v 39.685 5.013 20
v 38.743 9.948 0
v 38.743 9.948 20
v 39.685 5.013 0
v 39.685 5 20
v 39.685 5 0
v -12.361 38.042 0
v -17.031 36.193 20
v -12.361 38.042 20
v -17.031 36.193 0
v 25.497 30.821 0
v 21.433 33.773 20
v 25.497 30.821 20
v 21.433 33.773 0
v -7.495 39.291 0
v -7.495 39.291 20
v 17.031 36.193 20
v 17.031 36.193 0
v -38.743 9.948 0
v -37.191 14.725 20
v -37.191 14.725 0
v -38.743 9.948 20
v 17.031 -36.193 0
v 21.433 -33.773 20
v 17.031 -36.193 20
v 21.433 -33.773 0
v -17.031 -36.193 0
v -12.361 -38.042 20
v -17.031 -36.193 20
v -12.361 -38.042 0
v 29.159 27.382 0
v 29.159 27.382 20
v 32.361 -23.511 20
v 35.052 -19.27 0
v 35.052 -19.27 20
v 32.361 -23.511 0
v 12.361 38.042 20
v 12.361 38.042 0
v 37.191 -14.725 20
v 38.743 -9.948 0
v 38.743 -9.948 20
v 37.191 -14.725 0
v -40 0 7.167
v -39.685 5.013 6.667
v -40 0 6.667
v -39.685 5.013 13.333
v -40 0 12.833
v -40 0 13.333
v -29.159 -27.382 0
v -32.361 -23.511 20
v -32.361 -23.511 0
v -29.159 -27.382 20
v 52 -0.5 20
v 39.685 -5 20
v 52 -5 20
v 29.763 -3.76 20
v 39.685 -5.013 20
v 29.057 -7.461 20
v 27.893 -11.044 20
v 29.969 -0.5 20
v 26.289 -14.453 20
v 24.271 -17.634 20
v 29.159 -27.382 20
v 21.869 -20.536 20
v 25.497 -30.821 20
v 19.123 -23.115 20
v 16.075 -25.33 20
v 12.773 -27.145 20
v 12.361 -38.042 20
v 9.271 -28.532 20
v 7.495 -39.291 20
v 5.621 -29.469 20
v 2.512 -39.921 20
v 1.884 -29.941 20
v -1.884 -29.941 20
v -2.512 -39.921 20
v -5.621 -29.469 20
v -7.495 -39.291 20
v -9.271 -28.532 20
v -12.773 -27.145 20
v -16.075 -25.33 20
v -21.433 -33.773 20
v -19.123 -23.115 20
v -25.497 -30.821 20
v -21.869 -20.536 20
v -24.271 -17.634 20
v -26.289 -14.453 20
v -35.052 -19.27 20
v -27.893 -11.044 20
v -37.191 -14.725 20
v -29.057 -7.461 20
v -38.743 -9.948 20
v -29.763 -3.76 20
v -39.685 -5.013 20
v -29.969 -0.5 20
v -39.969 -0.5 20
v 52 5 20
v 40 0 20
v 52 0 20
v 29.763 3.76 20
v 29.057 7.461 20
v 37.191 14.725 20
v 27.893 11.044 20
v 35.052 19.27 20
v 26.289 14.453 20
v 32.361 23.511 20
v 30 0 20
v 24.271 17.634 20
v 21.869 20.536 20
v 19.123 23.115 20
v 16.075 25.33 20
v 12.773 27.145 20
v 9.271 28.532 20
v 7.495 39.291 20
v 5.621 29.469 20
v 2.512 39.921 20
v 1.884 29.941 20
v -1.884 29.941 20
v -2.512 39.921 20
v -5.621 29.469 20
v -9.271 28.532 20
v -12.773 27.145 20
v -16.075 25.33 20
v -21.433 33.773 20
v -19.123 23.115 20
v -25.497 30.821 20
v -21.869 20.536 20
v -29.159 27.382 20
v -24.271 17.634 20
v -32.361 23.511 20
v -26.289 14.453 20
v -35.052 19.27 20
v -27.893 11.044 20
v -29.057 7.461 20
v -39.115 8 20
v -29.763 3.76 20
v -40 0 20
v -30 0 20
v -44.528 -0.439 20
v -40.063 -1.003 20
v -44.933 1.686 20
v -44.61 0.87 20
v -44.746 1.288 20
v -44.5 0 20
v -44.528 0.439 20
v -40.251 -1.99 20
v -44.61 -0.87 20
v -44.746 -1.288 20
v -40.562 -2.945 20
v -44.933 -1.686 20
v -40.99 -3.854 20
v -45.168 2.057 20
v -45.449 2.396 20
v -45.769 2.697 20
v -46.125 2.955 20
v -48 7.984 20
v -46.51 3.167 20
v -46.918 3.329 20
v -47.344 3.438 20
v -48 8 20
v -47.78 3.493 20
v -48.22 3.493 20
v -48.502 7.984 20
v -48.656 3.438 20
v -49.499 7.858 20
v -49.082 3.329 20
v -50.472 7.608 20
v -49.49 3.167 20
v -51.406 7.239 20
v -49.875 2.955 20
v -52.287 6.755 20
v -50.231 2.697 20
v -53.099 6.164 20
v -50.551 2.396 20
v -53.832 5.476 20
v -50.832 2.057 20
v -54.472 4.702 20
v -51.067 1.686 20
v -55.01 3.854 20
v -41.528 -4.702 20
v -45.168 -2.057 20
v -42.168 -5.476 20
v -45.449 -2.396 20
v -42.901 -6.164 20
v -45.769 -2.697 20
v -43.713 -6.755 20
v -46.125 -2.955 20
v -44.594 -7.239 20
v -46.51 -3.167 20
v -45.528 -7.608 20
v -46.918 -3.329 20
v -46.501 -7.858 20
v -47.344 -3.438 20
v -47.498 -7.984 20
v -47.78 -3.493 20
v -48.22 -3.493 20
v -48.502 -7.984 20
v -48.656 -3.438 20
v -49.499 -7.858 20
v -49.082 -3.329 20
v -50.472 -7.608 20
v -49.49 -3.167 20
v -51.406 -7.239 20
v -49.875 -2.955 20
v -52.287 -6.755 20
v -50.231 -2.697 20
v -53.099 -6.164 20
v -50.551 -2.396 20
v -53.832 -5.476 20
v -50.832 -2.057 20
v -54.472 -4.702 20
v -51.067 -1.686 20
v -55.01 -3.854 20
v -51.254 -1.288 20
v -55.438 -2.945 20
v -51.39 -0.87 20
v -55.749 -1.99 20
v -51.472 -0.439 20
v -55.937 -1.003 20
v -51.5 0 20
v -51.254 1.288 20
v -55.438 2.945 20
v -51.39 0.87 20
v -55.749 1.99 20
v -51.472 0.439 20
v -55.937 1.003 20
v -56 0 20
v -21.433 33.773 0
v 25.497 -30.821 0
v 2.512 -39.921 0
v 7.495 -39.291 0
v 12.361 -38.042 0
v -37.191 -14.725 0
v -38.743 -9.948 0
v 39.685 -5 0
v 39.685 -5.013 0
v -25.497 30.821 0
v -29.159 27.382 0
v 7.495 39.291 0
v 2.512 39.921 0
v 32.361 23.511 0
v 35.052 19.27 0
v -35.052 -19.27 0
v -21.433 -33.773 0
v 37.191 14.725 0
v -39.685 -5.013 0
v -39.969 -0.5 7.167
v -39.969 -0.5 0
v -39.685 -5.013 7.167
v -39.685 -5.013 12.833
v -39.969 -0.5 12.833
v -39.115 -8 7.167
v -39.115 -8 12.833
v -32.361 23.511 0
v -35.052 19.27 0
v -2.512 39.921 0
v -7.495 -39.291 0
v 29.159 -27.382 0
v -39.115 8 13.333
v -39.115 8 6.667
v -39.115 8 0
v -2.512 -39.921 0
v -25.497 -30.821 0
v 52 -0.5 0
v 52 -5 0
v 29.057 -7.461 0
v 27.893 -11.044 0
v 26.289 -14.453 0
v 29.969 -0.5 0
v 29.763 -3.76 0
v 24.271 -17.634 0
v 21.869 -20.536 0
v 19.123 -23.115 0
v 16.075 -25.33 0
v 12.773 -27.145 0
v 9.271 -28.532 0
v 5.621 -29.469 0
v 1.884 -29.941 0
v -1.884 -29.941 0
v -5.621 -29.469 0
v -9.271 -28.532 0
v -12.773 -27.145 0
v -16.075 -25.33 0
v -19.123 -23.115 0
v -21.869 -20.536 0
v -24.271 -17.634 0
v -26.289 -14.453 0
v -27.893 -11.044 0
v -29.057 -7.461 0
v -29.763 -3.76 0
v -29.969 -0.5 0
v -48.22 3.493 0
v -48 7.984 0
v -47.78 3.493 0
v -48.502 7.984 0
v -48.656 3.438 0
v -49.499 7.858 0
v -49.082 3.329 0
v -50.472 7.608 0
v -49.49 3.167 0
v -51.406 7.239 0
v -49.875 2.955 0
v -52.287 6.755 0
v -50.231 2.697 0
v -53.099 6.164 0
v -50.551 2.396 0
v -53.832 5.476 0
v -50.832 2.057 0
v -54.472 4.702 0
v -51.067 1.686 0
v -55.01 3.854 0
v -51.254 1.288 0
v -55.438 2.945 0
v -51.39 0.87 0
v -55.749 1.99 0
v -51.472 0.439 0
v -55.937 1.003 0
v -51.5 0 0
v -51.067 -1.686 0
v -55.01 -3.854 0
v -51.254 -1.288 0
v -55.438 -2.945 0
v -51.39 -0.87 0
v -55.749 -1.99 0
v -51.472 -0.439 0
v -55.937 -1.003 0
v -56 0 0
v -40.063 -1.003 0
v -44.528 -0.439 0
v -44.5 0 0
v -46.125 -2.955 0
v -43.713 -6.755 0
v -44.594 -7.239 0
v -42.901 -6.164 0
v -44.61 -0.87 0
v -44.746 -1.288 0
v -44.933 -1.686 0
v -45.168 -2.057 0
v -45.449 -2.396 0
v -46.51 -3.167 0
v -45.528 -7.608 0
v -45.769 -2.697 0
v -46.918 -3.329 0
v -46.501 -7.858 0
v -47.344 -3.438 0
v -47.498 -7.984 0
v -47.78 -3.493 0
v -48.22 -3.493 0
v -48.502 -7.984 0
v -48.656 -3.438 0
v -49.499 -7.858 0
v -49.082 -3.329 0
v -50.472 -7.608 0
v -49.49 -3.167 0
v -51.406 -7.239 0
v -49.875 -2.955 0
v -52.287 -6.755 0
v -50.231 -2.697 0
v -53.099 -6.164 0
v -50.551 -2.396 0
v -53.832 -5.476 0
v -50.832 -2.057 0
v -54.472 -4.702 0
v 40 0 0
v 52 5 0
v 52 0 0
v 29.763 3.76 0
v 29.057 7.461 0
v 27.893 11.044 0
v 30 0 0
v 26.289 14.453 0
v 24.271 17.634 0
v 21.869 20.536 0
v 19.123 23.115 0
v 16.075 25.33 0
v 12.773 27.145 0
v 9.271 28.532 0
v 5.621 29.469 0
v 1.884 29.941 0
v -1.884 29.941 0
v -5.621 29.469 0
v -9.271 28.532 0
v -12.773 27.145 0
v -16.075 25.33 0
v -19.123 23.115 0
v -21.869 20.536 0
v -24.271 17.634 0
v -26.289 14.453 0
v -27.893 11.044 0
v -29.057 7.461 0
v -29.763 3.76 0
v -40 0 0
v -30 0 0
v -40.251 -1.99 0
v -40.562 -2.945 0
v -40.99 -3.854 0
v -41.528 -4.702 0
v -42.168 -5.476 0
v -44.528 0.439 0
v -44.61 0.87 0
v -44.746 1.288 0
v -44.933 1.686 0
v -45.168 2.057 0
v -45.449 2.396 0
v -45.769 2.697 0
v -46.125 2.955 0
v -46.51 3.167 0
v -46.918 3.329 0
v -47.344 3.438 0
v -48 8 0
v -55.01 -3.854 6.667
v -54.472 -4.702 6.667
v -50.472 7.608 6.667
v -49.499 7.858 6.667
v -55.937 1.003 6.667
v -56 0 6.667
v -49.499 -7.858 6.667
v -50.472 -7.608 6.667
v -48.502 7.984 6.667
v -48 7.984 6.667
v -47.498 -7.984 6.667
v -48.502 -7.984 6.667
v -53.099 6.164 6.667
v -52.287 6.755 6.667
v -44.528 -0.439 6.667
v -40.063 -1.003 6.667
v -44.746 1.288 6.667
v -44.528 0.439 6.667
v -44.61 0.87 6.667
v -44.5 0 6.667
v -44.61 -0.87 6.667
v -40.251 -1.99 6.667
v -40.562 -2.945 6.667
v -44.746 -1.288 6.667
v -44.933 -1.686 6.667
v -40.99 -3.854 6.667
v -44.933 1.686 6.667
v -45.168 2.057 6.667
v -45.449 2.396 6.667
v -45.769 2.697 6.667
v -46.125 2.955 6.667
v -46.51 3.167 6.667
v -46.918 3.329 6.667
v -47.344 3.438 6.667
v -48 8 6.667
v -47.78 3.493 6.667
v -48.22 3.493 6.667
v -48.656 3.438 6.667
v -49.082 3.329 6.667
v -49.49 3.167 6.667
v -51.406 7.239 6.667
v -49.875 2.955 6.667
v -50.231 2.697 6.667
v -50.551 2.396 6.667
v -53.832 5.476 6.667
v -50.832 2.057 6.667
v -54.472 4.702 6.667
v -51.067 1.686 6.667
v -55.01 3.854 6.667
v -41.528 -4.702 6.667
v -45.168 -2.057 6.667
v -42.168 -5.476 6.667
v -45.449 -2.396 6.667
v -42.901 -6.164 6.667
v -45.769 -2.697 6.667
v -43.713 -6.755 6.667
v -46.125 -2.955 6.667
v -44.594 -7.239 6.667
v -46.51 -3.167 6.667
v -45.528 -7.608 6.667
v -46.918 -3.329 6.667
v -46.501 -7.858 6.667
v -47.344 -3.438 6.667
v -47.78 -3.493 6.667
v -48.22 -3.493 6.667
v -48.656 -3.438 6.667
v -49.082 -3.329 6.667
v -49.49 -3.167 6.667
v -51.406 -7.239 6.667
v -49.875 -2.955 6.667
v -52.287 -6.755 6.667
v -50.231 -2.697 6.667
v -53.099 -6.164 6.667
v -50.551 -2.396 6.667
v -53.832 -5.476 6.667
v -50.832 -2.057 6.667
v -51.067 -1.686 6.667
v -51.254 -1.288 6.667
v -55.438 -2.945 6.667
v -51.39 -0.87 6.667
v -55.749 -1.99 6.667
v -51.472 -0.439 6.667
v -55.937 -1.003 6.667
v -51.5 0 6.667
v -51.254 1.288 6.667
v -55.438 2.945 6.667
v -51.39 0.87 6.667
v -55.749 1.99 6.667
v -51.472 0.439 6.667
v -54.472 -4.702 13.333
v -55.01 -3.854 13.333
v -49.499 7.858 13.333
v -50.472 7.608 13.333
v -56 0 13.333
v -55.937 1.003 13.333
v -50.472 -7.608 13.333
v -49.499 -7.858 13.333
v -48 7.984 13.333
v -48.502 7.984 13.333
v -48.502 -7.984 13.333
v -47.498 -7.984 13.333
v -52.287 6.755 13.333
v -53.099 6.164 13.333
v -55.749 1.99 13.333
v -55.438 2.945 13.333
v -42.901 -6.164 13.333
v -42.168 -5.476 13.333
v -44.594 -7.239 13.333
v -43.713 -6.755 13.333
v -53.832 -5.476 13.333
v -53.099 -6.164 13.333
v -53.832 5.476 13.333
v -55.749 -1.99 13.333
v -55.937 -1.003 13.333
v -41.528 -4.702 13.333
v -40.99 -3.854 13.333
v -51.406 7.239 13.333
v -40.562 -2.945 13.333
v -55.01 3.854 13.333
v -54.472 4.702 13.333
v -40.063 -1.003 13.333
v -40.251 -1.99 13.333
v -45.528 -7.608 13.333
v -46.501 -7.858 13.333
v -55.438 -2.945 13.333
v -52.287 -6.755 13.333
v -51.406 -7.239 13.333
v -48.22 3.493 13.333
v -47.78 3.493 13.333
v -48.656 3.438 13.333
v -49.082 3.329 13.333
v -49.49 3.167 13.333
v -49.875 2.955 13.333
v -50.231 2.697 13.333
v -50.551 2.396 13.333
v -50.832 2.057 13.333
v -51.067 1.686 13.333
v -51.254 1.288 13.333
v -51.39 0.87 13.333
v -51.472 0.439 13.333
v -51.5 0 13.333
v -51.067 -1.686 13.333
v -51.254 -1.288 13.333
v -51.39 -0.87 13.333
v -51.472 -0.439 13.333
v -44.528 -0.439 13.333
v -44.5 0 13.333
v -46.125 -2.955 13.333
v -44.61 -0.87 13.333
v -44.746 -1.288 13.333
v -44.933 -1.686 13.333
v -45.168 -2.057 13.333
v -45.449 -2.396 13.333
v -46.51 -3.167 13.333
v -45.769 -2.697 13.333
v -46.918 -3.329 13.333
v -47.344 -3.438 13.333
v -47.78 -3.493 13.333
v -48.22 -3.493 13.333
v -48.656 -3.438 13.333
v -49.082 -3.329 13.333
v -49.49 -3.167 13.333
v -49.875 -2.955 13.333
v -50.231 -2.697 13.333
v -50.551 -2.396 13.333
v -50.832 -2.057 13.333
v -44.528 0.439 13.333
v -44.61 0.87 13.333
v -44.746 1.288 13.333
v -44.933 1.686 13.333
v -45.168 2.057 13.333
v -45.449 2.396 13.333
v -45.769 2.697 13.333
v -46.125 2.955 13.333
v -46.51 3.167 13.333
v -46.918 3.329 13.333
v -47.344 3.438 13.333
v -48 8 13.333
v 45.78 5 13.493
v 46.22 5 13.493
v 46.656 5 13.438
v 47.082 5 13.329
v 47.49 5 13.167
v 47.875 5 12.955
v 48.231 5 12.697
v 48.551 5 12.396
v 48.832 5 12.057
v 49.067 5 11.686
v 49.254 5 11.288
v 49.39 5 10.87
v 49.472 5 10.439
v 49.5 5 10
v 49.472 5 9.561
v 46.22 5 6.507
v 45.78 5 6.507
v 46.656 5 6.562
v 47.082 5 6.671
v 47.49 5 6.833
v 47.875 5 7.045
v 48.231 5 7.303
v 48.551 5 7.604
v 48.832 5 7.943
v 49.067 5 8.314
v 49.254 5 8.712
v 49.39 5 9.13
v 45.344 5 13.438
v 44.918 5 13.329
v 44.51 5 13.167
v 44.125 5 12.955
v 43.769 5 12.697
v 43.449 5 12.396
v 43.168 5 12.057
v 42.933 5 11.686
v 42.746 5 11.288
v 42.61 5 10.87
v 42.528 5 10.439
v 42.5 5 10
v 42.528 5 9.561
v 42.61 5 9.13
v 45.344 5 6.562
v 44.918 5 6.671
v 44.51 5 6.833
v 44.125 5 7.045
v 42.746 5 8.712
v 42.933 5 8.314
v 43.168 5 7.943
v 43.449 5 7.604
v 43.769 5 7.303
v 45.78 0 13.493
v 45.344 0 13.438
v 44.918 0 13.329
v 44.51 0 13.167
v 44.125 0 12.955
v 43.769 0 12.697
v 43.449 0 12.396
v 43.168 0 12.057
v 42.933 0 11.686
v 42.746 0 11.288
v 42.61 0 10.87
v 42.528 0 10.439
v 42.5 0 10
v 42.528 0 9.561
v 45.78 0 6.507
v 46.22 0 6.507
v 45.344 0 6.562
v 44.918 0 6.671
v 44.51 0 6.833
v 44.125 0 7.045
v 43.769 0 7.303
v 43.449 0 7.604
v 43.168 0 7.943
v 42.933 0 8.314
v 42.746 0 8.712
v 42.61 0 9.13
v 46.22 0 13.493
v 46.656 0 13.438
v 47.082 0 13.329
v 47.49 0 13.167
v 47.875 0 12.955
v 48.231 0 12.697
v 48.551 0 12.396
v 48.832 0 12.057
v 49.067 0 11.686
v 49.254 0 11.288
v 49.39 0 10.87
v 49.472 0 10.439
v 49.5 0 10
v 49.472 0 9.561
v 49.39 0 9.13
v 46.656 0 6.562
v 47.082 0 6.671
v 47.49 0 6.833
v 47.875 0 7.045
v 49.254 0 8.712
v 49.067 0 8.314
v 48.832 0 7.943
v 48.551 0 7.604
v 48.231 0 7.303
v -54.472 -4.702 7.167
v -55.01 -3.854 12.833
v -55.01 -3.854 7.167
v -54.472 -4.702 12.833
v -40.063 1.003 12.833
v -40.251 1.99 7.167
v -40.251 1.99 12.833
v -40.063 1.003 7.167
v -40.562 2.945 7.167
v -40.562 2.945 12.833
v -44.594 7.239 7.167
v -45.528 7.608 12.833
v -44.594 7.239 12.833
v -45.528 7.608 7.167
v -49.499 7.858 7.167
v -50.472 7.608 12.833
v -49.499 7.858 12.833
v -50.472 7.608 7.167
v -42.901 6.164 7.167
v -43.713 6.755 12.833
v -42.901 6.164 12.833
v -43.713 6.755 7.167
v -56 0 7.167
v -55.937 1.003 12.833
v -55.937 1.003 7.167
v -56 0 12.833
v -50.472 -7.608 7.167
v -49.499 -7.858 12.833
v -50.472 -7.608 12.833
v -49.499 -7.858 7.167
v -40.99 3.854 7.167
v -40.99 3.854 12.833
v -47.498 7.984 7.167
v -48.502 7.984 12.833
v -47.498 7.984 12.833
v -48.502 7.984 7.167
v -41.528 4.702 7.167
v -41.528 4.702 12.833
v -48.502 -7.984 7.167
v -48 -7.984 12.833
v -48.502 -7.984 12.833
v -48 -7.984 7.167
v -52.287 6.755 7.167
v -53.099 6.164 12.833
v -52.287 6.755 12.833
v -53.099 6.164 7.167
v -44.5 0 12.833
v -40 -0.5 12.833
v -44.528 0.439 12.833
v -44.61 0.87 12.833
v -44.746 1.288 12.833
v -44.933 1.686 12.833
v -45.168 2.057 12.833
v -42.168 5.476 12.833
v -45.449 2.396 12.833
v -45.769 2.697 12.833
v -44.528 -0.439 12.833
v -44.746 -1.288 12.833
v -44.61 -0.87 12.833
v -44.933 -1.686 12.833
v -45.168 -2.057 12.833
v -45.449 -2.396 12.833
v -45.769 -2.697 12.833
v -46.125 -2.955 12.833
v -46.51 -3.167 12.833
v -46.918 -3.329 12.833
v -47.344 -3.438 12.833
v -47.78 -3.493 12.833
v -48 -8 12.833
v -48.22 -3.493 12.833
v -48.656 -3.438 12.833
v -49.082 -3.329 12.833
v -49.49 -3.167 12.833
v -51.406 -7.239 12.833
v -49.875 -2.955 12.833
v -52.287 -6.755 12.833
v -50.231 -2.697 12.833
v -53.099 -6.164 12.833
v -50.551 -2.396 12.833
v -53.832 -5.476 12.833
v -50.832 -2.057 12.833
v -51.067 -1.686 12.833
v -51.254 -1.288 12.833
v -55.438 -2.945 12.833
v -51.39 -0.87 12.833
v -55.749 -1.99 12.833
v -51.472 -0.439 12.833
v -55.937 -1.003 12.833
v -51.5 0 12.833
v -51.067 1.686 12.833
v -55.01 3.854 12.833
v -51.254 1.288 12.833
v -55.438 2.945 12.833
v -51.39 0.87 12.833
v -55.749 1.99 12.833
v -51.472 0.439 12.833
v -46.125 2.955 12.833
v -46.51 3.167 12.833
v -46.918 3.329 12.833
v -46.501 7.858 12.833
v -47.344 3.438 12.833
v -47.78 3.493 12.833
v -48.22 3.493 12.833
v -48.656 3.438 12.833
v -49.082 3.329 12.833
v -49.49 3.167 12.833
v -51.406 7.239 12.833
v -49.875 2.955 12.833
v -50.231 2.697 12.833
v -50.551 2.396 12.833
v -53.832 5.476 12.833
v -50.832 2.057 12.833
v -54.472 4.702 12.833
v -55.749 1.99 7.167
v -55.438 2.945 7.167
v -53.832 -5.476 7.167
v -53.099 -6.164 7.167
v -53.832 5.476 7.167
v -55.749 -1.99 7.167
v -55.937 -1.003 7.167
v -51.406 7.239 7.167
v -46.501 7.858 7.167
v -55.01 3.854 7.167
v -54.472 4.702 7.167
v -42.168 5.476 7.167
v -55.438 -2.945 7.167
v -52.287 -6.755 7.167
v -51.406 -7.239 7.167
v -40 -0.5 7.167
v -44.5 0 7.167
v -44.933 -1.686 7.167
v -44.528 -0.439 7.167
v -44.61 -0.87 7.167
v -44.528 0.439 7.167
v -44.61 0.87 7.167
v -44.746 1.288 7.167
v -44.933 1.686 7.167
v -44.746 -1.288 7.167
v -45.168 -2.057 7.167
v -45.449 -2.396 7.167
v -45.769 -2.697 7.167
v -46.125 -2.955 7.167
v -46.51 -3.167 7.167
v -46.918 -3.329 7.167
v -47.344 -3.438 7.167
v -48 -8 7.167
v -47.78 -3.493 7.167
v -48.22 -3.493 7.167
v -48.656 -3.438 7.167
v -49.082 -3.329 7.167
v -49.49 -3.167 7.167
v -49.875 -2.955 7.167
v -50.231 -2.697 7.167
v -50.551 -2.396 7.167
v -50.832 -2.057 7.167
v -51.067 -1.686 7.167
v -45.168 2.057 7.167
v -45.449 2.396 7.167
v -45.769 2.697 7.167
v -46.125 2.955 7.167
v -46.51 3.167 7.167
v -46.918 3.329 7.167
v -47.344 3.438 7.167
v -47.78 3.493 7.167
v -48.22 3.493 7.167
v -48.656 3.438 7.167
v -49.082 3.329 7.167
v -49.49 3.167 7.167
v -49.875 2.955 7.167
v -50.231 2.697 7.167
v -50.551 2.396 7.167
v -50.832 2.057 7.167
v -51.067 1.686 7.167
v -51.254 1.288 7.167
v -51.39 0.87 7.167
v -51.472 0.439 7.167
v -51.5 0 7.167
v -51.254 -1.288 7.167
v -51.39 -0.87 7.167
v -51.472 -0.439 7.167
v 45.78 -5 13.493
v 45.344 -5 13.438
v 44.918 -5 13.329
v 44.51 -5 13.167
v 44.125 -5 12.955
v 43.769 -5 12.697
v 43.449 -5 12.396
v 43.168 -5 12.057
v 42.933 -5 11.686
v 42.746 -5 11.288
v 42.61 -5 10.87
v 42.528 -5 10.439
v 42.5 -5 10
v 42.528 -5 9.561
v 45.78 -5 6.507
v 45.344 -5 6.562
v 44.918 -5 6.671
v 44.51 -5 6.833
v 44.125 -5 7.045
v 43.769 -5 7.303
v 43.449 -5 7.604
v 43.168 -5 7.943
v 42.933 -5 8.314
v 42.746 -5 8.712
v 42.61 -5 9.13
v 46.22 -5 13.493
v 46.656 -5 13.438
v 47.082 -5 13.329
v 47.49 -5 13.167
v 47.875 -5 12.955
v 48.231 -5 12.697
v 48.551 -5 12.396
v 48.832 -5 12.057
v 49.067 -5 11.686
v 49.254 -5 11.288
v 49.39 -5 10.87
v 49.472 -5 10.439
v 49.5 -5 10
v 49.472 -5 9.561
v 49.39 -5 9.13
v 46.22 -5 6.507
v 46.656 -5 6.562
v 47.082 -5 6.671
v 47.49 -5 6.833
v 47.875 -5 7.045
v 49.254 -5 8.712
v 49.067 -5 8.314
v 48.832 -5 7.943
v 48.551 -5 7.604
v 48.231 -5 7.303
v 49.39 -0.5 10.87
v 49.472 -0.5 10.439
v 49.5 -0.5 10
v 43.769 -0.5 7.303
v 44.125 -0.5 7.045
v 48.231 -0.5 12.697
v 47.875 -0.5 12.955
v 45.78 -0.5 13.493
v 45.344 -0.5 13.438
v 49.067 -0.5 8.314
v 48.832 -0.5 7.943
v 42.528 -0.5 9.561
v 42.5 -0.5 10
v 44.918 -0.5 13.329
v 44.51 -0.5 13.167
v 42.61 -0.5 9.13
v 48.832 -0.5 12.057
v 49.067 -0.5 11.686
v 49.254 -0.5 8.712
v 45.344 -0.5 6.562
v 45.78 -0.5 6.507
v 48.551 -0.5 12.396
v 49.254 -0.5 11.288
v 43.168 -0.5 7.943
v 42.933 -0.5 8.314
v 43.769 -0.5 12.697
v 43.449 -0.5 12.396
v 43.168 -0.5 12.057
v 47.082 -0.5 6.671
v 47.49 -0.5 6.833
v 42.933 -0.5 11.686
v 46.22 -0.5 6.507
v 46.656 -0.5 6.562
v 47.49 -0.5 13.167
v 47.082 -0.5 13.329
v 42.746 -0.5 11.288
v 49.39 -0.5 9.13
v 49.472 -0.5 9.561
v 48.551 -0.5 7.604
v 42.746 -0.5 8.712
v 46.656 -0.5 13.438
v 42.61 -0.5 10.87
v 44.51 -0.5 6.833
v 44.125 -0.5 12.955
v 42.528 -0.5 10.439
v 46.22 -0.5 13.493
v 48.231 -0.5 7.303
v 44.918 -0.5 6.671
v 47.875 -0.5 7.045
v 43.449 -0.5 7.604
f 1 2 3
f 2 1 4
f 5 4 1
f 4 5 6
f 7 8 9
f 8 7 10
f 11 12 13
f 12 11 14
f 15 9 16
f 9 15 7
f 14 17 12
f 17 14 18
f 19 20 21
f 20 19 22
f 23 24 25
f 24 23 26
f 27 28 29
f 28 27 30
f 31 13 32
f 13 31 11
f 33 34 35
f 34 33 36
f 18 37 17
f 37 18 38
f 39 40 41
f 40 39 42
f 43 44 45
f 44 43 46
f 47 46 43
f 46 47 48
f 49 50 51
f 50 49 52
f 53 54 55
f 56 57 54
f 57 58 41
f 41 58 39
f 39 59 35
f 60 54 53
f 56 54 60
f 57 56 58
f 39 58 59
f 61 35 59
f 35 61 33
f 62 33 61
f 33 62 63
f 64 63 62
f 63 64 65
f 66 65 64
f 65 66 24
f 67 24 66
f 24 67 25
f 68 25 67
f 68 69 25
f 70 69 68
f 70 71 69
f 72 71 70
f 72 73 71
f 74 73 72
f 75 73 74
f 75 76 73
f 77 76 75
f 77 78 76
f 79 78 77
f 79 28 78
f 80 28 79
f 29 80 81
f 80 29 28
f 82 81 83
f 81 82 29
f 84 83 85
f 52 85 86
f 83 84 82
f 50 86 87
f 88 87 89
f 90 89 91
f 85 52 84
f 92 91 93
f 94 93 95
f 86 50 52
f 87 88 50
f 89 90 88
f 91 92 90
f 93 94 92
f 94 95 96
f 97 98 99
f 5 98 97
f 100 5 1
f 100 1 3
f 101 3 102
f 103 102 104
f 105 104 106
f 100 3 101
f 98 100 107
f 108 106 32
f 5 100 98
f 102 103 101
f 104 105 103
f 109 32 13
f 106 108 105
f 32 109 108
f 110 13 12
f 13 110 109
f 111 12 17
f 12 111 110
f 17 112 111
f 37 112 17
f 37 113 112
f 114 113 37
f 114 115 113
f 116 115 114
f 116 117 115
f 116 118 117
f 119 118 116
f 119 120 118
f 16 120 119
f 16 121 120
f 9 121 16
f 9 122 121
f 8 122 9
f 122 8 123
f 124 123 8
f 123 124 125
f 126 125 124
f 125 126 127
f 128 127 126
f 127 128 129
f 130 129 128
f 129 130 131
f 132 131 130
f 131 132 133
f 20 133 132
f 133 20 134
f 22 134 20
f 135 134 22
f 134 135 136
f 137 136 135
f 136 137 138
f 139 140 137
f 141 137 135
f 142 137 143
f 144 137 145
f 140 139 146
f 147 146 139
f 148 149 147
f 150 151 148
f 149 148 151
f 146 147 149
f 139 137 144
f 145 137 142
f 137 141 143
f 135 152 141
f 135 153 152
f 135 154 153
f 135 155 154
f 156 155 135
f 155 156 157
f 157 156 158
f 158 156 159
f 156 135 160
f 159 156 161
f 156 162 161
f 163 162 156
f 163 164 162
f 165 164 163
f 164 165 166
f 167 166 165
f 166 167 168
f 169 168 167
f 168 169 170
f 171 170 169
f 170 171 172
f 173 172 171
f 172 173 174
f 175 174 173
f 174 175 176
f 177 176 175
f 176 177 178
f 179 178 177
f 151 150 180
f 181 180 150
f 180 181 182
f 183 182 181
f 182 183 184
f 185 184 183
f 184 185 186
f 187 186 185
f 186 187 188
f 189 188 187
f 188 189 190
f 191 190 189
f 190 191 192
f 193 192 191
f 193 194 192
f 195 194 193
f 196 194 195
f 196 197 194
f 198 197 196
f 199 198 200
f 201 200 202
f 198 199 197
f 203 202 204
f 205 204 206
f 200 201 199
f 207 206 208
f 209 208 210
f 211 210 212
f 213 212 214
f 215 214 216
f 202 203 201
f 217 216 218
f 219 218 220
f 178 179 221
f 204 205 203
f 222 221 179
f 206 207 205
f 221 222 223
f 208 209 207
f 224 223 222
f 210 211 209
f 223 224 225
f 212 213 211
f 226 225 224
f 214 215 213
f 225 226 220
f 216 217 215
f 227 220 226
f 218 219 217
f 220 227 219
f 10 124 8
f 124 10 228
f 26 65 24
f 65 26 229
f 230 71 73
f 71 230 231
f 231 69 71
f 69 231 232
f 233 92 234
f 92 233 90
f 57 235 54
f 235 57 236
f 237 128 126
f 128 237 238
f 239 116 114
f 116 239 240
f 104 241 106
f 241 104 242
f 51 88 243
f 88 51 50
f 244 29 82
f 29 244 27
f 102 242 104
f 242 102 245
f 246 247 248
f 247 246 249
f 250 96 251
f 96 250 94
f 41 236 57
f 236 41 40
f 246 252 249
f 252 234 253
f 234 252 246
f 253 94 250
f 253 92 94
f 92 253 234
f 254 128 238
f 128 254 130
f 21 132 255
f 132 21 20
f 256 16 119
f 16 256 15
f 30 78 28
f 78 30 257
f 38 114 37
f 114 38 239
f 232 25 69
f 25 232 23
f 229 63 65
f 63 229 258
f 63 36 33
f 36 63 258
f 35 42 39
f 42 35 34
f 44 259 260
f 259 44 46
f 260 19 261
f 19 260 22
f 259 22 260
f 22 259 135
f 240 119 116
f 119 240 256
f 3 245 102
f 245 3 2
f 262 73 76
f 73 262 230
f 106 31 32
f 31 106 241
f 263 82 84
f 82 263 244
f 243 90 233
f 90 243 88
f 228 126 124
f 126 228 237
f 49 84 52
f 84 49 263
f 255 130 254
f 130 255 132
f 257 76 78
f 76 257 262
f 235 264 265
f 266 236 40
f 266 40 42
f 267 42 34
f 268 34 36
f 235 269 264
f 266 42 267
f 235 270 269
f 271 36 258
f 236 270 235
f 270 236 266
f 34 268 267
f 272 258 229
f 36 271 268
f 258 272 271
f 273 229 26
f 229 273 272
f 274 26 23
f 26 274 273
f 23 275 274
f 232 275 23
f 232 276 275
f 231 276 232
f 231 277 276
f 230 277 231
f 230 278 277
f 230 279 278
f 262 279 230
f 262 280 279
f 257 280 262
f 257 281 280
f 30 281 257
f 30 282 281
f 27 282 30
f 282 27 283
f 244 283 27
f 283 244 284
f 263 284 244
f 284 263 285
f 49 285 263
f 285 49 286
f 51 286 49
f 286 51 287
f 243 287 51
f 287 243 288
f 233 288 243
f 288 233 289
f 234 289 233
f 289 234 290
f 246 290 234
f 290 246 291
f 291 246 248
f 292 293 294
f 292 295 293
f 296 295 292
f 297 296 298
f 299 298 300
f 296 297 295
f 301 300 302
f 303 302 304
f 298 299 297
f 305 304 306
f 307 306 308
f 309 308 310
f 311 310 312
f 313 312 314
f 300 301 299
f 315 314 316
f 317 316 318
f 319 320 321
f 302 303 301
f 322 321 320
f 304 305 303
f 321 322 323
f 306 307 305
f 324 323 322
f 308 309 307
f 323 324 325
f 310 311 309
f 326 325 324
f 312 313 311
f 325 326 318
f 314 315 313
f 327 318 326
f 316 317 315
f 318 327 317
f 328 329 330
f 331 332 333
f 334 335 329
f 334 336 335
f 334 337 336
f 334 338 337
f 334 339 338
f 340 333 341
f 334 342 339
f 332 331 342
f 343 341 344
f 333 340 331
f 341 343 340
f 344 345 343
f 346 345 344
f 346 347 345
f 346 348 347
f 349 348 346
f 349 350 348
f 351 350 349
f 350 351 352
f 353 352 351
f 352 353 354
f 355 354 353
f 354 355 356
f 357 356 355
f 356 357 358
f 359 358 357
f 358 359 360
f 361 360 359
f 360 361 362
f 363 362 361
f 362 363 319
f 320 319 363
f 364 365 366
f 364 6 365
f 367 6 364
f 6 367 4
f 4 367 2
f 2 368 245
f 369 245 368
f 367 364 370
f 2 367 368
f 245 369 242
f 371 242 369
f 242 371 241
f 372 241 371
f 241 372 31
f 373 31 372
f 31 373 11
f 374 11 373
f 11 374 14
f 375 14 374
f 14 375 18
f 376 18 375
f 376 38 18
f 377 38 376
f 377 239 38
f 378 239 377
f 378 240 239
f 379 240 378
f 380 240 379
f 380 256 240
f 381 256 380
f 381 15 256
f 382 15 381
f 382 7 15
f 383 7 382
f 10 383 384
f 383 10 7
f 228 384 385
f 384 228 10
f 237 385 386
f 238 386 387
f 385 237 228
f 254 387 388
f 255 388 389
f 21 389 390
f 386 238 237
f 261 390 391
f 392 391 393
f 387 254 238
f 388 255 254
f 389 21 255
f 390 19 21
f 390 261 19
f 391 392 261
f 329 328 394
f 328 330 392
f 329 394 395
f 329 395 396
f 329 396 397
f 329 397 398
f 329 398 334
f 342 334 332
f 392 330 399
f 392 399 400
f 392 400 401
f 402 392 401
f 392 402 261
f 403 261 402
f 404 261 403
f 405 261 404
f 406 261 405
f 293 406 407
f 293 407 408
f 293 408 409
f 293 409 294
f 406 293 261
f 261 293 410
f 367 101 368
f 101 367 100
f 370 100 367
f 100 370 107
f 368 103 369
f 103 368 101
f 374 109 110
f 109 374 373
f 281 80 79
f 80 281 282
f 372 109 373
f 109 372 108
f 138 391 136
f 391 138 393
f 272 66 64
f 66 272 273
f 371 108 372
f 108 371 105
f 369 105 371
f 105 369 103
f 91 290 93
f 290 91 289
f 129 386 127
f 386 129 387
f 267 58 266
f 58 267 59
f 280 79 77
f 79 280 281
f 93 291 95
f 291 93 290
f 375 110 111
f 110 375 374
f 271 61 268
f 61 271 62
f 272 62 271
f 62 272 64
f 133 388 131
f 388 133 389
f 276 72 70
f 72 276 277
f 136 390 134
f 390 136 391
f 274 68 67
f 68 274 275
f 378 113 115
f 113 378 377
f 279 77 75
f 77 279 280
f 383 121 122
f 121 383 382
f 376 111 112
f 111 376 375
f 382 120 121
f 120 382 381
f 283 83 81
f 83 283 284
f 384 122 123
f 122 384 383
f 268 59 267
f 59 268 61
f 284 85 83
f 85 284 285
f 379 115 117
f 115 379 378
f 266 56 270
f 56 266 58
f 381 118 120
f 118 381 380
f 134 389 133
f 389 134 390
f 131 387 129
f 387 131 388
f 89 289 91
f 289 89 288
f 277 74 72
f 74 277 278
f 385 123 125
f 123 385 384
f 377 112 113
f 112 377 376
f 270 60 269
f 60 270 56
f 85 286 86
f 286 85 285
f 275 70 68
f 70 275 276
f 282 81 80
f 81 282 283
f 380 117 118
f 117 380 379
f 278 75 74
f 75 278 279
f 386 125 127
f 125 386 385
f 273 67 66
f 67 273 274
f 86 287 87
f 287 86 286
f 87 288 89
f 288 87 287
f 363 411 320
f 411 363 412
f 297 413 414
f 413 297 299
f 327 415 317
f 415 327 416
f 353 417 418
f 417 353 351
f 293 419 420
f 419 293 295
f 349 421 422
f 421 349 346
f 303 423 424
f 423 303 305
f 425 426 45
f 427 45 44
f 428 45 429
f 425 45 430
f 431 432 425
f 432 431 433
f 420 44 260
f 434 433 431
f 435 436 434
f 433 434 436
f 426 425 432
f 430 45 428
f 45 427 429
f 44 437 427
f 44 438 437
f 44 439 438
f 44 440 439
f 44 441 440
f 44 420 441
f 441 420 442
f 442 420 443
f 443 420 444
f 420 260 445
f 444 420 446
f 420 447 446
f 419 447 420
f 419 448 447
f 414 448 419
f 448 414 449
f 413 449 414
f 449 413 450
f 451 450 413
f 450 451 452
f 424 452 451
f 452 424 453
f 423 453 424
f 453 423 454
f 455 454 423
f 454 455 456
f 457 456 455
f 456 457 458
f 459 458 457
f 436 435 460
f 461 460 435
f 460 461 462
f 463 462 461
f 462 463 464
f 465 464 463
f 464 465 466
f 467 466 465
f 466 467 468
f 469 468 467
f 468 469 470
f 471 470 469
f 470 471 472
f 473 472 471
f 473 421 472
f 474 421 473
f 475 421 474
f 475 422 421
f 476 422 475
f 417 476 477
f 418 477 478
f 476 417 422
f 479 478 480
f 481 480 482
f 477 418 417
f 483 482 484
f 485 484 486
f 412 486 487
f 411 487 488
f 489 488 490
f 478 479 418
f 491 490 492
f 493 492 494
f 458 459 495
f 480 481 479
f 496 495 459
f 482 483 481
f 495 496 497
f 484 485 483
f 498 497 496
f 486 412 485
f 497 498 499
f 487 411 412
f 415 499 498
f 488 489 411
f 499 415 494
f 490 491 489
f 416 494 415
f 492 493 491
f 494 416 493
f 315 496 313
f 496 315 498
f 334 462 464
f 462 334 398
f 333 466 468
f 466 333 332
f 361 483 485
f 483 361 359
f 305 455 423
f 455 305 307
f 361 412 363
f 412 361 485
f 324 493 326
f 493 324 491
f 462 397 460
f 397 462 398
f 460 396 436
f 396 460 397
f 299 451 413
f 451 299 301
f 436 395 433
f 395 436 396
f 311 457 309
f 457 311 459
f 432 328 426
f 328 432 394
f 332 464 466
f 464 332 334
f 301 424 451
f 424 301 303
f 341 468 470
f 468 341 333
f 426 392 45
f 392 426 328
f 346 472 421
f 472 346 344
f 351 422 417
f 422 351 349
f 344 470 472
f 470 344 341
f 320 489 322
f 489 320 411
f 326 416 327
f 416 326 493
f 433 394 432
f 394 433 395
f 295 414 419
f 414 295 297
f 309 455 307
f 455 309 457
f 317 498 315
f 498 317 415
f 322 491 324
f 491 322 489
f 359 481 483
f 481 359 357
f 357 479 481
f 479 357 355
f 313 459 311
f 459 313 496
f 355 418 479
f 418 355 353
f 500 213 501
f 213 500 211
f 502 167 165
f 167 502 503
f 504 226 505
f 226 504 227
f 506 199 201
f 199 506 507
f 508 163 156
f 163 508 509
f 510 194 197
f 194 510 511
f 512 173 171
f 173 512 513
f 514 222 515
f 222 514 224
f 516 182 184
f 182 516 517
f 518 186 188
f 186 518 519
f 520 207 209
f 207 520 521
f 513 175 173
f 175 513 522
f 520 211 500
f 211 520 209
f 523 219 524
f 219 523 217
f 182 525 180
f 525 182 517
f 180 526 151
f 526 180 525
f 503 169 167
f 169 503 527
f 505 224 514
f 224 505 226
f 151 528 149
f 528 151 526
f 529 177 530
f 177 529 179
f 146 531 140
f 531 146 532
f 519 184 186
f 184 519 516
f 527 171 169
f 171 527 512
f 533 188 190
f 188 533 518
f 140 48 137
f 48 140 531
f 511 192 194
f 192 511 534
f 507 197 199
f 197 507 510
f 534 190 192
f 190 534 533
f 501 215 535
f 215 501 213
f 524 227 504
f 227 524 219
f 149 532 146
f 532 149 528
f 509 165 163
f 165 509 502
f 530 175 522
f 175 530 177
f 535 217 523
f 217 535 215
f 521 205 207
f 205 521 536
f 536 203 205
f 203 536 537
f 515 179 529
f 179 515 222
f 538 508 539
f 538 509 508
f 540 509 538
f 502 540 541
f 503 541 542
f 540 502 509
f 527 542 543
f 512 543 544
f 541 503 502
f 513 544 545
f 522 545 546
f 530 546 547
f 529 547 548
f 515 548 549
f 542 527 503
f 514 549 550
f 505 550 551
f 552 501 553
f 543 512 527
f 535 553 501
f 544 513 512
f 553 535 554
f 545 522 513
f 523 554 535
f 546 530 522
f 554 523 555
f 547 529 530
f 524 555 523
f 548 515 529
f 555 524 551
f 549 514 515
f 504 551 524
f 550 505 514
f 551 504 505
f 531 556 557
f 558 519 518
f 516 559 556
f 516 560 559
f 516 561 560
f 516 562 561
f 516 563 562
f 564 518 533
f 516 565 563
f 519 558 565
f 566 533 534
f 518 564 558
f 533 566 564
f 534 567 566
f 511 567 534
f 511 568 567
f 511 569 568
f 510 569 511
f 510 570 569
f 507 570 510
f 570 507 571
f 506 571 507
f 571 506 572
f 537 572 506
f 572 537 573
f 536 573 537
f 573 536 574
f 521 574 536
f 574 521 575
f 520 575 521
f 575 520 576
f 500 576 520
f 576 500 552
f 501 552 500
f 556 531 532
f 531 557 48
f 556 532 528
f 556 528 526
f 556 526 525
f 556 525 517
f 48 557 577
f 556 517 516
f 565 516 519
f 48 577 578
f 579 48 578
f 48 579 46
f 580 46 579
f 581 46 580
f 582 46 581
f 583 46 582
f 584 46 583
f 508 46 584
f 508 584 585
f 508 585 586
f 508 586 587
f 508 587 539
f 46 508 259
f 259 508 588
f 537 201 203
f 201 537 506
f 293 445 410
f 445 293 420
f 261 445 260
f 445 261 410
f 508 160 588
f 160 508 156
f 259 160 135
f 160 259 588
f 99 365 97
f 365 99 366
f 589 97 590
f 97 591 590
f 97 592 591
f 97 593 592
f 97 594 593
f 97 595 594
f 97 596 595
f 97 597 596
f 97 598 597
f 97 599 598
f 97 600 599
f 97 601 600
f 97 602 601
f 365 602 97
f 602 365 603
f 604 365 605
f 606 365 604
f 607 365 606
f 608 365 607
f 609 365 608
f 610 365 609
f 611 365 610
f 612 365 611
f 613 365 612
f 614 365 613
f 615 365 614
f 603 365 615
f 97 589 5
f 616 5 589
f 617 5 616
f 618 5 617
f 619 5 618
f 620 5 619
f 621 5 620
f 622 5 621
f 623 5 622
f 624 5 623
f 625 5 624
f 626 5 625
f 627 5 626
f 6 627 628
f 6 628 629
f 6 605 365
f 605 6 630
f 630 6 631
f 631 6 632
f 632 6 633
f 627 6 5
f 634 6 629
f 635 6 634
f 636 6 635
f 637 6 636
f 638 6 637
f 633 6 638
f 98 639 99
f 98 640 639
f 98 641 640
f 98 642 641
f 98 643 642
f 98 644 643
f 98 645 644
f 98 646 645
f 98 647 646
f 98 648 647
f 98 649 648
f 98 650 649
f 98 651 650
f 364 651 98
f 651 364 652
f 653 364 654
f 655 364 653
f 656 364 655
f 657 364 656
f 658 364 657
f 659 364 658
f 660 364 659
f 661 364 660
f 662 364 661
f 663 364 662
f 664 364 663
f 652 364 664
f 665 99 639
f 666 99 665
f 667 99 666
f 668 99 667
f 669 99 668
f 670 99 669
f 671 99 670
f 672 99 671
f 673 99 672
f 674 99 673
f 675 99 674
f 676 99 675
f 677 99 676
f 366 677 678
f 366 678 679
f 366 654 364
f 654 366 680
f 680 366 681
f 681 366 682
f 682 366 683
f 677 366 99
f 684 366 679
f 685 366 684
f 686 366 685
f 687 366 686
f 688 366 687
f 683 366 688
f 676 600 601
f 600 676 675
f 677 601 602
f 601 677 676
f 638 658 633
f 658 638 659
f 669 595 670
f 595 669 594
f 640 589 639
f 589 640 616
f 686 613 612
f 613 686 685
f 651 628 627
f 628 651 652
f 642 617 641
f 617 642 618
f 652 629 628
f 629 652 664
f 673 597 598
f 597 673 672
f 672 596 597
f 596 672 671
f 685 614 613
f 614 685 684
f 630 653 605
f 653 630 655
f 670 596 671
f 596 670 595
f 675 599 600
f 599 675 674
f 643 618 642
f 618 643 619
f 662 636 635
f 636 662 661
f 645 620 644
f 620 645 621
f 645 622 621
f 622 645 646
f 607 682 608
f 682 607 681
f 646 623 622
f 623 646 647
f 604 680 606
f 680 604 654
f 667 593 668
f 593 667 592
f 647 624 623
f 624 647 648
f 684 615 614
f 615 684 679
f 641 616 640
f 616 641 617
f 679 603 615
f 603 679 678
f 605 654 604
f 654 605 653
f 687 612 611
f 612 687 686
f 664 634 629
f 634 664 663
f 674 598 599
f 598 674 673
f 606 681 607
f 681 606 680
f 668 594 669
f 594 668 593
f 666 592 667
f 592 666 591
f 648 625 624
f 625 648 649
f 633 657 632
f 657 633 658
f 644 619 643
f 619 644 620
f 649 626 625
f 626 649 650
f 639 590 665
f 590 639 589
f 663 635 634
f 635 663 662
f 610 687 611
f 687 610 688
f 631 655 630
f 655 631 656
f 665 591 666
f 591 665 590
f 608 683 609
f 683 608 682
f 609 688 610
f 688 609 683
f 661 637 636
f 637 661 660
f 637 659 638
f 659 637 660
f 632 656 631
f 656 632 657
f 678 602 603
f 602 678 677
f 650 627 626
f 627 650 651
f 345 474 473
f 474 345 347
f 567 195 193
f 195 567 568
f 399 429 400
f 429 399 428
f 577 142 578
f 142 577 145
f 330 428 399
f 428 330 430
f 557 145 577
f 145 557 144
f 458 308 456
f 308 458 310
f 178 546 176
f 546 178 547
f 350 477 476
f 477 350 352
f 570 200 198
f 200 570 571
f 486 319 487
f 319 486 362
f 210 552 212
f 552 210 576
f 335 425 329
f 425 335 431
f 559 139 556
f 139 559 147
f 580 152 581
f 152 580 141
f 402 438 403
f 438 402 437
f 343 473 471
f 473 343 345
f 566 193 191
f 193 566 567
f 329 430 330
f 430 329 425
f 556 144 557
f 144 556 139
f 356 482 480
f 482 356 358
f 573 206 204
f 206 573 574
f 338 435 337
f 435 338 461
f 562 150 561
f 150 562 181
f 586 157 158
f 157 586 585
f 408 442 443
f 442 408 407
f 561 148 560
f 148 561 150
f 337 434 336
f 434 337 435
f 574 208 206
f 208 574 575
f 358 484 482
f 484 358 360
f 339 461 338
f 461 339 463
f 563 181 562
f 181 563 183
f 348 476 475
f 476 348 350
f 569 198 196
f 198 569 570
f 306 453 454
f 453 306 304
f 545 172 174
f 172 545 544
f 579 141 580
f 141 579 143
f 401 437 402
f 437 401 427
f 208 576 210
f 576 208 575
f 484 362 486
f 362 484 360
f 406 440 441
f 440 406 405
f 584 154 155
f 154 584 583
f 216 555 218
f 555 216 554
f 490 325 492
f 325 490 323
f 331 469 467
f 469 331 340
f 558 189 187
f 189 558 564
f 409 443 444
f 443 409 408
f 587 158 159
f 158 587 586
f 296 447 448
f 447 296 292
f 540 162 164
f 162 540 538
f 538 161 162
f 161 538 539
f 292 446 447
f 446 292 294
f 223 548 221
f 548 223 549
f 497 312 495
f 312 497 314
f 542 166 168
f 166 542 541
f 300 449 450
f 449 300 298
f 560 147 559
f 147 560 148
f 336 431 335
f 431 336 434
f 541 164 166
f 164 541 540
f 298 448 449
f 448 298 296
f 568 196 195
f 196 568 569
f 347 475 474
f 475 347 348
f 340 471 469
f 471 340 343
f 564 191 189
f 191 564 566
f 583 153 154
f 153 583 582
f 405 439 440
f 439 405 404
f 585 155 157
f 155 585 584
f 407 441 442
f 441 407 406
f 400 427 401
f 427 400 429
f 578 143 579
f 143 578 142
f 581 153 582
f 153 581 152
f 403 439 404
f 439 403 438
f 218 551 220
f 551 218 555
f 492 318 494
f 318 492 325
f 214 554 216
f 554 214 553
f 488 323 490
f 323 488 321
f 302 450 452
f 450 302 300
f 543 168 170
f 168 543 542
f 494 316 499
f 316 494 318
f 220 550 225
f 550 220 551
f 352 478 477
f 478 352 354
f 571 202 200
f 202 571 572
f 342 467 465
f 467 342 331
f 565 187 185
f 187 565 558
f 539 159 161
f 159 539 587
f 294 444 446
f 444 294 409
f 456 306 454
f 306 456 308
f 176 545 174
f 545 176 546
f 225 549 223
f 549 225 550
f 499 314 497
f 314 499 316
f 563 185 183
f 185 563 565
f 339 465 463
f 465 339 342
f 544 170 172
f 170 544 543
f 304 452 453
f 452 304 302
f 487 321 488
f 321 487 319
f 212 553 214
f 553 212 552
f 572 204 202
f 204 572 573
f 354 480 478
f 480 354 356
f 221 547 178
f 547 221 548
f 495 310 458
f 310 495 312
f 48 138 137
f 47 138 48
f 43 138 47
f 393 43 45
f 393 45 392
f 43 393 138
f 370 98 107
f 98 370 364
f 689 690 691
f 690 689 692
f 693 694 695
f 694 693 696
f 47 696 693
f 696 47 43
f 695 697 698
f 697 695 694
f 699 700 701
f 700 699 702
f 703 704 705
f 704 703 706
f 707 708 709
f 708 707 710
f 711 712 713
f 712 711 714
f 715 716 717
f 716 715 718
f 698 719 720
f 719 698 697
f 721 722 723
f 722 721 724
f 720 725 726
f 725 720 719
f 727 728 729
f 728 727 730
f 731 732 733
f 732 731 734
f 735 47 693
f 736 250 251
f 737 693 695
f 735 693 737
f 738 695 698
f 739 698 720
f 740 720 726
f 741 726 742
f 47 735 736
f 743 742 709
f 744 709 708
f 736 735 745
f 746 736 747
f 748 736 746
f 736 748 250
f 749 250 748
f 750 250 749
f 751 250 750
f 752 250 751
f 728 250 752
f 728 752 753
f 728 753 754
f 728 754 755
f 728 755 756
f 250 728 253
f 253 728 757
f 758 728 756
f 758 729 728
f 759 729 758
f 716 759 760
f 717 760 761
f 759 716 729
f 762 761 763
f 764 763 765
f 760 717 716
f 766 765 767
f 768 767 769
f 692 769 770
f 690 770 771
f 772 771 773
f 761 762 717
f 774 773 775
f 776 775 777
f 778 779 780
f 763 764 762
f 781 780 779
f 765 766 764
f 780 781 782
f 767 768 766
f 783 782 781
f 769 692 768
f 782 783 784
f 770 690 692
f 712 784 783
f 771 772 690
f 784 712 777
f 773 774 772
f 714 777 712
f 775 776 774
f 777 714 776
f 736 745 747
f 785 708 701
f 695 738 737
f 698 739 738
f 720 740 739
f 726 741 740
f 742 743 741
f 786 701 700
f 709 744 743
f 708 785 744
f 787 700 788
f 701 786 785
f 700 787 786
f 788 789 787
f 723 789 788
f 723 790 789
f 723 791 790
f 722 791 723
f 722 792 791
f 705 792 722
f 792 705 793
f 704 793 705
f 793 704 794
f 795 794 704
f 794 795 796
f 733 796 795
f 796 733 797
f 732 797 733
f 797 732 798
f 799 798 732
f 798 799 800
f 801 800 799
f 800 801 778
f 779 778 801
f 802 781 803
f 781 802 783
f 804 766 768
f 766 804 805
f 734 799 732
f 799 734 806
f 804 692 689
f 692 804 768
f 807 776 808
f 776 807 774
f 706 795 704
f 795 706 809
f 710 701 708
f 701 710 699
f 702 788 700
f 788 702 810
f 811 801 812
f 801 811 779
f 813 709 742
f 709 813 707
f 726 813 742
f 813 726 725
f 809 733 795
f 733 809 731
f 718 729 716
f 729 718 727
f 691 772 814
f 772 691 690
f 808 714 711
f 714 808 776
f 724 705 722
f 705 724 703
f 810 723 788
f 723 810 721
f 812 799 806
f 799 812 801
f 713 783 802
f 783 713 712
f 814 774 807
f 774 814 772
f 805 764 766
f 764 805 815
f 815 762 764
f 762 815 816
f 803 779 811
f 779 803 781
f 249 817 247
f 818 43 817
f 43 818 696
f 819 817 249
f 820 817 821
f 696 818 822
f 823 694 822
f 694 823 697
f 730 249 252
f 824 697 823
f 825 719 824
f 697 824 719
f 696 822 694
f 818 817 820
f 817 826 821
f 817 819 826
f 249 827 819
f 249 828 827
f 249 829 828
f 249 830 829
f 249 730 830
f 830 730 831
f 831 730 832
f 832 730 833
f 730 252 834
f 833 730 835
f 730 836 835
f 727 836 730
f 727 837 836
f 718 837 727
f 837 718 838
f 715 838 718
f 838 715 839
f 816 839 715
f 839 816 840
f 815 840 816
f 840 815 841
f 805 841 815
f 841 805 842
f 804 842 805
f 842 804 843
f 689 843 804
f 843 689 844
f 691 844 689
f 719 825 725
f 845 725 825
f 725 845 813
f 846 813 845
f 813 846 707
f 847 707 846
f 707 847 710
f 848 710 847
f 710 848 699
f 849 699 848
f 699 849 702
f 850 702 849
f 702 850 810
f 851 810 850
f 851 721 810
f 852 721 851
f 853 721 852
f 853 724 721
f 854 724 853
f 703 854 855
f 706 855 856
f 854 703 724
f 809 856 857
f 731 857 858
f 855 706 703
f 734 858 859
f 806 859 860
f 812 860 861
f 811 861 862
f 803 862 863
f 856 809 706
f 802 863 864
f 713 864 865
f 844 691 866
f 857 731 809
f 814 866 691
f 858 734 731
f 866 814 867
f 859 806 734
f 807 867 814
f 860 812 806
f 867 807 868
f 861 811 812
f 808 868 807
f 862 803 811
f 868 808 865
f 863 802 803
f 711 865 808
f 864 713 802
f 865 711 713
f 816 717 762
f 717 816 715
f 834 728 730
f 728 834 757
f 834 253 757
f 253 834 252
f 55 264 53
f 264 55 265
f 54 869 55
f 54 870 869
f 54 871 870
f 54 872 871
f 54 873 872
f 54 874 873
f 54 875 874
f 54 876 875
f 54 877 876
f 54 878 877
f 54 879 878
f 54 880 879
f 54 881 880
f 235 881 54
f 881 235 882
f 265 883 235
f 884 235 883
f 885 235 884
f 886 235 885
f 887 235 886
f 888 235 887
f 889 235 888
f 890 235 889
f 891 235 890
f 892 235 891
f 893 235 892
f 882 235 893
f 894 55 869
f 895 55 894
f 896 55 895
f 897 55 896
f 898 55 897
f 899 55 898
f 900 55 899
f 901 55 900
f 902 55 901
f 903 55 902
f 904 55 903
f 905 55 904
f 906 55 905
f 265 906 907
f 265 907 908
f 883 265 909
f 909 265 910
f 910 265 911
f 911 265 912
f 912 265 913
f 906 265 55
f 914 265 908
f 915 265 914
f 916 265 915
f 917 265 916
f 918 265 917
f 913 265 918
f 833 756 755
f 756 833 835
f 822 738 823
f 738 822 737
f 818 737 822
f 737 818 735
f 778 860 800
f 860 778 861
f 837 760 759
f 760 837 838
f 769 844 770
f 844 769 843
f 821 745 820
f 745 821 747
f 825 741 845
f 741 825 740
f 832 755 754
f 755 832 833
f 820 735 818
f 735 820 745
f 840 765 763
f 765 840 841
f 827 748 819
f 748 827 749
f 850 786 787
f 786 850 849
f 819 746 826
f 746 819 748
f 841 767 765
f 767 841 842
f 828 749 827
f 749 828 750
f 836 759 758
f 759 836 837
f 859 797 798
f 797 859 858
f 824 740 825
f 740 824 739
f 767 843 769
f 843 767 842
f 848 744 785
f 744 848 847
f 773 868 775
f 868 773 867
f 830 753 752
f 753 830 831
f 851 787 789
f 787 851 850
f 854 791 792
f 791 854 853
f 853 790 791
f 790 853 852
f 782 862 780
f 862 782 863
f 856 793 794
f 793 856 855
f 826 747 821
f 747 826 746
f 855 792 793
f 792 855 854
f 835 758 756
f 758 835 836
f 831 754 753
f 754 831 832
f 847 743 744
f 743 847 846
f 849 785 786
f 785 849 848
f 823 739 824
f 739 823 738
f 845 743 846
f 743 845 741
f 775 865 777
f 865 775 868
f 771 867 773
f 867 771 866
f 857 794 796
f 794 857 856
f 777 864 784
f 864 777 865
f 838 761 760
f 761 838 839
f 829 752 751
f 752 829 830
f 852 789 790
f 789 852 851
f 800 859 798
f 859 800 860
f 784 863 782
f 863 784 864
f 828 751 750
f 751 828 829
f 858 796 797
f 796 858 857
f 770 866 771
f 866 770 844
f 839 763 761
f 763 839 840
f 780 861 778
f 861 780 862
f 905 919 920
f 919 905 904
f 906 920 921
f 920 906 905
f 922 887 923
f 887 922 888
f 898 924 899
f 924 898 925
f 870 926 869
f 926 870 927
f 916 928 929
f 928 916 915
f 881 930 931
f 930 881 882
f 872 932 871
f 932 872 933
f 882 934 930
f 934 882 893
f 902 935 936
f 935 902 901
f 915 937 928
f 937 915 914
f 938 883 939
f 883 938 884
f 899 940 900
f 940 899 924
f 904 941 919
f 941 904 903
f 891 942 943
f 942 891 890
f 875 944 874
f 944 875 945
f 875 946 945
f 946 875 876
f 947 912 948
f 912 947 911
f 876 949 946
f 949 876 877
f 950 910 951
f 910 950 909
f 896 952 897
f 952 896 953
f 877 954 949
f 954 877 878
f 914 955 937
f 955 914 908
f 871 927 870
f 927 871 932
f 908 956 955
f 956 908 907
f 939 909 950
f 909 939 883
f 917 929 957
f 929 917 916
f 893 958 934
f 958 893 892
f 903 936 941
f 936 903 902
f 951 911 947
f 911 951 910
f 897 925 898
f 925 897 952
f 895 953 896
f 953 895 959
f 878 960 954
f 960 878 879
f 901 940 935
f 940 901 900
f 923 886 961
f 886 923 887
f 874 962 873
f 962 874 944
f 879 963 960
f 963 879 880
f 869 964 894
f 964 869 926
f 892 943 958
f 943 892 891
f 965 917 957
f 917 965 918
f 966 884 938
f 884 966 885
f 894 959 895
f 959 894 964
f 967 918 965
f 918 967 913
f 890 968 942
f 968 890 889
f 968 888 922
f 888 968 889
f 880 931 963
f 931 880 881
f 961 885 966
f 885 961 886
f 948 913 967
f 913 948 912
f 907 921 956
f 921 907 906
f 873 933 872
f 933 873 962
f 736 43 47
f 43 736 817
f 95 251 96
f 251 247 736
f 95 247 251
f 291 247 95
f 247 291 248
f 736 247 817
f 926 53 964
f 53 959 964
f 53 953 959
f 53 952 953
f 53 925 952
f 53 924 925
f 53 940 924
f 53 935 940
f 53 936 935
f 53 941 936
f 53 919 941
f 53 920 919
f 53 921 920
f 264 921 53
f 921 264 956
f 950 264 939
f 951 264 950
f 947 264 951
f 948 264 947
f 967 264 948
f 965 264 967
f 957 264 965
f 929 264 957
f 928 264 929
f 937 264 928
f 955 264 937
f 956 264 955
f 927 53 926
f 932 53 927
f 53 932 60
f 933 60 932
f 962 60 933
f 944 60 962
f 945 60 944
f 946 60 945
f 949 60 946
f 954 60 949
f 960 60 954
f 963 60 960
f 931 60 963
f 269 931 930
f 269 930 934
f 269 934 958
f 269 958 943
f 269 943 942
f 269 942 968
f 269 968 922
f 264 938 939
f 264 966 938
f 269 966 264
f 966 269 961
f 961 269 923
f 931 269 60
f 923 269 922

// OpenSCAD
// Customizable Pipe Clamp
// Author Mathias Dietz
// http://gcodeprintr.dietzm.de

//Radius of the pipe 
r1=30; 
//Width of the pipe clamp
h=20; // [10:100] 
//Strength of the pipe clamp
s=10; // [10:Strong,8:Normal, 6:Light]
//Radius of the screw holes 
r4=3.5; // [1.5:0.5:5] 
//Connector Type
con=0; // [0:None,1:Hole,2:Cube]

/* [Hidden] */

r2=r1+s; 
w=14; 
r3=8; 
th=5; 
$fn=50;

oring();
//translate([-3,16.5,0]) rotate([0,0,20]) oring();

difference(){
    uring();
 if (con==1) {
     translate([0,-5,h/2]) rotate([90,0,0]) cylinder(r=r4,h=r2) ;
     translate([0,0,h/2]) rotate([90,0,0]) cylinder(r=r4+2,h=r1+strong/4) ;
 } 
}
if (con==2) {
    difference(){
     translate([-s/2,r2-s/4,0]) cube([s,w+0.5,h]);
     translate([-s,r2+w/2-0.5,h/2]) rotate([90,0,90]) cylinder(r=r4,h=r2) ;
    }
 } 

module uring(){
difference(){
union(){
    ring();
translate([-r2-r3,0,h/3+0.5]) cylinder(r=r3,h=h/3-1);
translate([-r2-r3,-r3,h/3+0.5]) cube([w,r3,h/3-1]);
 translate([r2-2,-th,0]) cube([w,th,h]);
}
translate([-r2-r3,0,h/3]) cylinder(r=r4,h=h/3);
translate([r2+w/2-1,0,h/2]) rotate([90,0,0]) cylinder(r=r4,h=th+1) ;
translate([-r2,-0.5,0]) cube([r2*2+w,r2+1,h+1]);
}
}

module oring(){

difference(){
union(){
      ring();
translate([-r2-r3,0,0]) cylinder(r=r3,h=h/3);
translate([-r2-r3,0,h/3*2]) cylinder(r=r3,h=h/3);
translate([-r2-r3,0,0]) cube([w,r3,h/3]);
    translate([-r2-r3,0,h/3*2]) cube([w,r3,h/3]);
    translate([r2-2,0,0]) cube([w,th,h]);
}
translate([r2+w/2-1,th+1,h/2]) rotate([90,0,0]) cylinder(r=r4,h=th+1) ;
translate([-r2-r3,0,0]) cylinder(r=r4,h=h);
translate([-r2,-r2,0]) cube([r2*2,r2,h+1]); //halbkreis
}
}


module ring(){
    difference(){
        cylinder(r=r2,h=h);
        cylinder(r=r1,h=h+1);
    }
}
